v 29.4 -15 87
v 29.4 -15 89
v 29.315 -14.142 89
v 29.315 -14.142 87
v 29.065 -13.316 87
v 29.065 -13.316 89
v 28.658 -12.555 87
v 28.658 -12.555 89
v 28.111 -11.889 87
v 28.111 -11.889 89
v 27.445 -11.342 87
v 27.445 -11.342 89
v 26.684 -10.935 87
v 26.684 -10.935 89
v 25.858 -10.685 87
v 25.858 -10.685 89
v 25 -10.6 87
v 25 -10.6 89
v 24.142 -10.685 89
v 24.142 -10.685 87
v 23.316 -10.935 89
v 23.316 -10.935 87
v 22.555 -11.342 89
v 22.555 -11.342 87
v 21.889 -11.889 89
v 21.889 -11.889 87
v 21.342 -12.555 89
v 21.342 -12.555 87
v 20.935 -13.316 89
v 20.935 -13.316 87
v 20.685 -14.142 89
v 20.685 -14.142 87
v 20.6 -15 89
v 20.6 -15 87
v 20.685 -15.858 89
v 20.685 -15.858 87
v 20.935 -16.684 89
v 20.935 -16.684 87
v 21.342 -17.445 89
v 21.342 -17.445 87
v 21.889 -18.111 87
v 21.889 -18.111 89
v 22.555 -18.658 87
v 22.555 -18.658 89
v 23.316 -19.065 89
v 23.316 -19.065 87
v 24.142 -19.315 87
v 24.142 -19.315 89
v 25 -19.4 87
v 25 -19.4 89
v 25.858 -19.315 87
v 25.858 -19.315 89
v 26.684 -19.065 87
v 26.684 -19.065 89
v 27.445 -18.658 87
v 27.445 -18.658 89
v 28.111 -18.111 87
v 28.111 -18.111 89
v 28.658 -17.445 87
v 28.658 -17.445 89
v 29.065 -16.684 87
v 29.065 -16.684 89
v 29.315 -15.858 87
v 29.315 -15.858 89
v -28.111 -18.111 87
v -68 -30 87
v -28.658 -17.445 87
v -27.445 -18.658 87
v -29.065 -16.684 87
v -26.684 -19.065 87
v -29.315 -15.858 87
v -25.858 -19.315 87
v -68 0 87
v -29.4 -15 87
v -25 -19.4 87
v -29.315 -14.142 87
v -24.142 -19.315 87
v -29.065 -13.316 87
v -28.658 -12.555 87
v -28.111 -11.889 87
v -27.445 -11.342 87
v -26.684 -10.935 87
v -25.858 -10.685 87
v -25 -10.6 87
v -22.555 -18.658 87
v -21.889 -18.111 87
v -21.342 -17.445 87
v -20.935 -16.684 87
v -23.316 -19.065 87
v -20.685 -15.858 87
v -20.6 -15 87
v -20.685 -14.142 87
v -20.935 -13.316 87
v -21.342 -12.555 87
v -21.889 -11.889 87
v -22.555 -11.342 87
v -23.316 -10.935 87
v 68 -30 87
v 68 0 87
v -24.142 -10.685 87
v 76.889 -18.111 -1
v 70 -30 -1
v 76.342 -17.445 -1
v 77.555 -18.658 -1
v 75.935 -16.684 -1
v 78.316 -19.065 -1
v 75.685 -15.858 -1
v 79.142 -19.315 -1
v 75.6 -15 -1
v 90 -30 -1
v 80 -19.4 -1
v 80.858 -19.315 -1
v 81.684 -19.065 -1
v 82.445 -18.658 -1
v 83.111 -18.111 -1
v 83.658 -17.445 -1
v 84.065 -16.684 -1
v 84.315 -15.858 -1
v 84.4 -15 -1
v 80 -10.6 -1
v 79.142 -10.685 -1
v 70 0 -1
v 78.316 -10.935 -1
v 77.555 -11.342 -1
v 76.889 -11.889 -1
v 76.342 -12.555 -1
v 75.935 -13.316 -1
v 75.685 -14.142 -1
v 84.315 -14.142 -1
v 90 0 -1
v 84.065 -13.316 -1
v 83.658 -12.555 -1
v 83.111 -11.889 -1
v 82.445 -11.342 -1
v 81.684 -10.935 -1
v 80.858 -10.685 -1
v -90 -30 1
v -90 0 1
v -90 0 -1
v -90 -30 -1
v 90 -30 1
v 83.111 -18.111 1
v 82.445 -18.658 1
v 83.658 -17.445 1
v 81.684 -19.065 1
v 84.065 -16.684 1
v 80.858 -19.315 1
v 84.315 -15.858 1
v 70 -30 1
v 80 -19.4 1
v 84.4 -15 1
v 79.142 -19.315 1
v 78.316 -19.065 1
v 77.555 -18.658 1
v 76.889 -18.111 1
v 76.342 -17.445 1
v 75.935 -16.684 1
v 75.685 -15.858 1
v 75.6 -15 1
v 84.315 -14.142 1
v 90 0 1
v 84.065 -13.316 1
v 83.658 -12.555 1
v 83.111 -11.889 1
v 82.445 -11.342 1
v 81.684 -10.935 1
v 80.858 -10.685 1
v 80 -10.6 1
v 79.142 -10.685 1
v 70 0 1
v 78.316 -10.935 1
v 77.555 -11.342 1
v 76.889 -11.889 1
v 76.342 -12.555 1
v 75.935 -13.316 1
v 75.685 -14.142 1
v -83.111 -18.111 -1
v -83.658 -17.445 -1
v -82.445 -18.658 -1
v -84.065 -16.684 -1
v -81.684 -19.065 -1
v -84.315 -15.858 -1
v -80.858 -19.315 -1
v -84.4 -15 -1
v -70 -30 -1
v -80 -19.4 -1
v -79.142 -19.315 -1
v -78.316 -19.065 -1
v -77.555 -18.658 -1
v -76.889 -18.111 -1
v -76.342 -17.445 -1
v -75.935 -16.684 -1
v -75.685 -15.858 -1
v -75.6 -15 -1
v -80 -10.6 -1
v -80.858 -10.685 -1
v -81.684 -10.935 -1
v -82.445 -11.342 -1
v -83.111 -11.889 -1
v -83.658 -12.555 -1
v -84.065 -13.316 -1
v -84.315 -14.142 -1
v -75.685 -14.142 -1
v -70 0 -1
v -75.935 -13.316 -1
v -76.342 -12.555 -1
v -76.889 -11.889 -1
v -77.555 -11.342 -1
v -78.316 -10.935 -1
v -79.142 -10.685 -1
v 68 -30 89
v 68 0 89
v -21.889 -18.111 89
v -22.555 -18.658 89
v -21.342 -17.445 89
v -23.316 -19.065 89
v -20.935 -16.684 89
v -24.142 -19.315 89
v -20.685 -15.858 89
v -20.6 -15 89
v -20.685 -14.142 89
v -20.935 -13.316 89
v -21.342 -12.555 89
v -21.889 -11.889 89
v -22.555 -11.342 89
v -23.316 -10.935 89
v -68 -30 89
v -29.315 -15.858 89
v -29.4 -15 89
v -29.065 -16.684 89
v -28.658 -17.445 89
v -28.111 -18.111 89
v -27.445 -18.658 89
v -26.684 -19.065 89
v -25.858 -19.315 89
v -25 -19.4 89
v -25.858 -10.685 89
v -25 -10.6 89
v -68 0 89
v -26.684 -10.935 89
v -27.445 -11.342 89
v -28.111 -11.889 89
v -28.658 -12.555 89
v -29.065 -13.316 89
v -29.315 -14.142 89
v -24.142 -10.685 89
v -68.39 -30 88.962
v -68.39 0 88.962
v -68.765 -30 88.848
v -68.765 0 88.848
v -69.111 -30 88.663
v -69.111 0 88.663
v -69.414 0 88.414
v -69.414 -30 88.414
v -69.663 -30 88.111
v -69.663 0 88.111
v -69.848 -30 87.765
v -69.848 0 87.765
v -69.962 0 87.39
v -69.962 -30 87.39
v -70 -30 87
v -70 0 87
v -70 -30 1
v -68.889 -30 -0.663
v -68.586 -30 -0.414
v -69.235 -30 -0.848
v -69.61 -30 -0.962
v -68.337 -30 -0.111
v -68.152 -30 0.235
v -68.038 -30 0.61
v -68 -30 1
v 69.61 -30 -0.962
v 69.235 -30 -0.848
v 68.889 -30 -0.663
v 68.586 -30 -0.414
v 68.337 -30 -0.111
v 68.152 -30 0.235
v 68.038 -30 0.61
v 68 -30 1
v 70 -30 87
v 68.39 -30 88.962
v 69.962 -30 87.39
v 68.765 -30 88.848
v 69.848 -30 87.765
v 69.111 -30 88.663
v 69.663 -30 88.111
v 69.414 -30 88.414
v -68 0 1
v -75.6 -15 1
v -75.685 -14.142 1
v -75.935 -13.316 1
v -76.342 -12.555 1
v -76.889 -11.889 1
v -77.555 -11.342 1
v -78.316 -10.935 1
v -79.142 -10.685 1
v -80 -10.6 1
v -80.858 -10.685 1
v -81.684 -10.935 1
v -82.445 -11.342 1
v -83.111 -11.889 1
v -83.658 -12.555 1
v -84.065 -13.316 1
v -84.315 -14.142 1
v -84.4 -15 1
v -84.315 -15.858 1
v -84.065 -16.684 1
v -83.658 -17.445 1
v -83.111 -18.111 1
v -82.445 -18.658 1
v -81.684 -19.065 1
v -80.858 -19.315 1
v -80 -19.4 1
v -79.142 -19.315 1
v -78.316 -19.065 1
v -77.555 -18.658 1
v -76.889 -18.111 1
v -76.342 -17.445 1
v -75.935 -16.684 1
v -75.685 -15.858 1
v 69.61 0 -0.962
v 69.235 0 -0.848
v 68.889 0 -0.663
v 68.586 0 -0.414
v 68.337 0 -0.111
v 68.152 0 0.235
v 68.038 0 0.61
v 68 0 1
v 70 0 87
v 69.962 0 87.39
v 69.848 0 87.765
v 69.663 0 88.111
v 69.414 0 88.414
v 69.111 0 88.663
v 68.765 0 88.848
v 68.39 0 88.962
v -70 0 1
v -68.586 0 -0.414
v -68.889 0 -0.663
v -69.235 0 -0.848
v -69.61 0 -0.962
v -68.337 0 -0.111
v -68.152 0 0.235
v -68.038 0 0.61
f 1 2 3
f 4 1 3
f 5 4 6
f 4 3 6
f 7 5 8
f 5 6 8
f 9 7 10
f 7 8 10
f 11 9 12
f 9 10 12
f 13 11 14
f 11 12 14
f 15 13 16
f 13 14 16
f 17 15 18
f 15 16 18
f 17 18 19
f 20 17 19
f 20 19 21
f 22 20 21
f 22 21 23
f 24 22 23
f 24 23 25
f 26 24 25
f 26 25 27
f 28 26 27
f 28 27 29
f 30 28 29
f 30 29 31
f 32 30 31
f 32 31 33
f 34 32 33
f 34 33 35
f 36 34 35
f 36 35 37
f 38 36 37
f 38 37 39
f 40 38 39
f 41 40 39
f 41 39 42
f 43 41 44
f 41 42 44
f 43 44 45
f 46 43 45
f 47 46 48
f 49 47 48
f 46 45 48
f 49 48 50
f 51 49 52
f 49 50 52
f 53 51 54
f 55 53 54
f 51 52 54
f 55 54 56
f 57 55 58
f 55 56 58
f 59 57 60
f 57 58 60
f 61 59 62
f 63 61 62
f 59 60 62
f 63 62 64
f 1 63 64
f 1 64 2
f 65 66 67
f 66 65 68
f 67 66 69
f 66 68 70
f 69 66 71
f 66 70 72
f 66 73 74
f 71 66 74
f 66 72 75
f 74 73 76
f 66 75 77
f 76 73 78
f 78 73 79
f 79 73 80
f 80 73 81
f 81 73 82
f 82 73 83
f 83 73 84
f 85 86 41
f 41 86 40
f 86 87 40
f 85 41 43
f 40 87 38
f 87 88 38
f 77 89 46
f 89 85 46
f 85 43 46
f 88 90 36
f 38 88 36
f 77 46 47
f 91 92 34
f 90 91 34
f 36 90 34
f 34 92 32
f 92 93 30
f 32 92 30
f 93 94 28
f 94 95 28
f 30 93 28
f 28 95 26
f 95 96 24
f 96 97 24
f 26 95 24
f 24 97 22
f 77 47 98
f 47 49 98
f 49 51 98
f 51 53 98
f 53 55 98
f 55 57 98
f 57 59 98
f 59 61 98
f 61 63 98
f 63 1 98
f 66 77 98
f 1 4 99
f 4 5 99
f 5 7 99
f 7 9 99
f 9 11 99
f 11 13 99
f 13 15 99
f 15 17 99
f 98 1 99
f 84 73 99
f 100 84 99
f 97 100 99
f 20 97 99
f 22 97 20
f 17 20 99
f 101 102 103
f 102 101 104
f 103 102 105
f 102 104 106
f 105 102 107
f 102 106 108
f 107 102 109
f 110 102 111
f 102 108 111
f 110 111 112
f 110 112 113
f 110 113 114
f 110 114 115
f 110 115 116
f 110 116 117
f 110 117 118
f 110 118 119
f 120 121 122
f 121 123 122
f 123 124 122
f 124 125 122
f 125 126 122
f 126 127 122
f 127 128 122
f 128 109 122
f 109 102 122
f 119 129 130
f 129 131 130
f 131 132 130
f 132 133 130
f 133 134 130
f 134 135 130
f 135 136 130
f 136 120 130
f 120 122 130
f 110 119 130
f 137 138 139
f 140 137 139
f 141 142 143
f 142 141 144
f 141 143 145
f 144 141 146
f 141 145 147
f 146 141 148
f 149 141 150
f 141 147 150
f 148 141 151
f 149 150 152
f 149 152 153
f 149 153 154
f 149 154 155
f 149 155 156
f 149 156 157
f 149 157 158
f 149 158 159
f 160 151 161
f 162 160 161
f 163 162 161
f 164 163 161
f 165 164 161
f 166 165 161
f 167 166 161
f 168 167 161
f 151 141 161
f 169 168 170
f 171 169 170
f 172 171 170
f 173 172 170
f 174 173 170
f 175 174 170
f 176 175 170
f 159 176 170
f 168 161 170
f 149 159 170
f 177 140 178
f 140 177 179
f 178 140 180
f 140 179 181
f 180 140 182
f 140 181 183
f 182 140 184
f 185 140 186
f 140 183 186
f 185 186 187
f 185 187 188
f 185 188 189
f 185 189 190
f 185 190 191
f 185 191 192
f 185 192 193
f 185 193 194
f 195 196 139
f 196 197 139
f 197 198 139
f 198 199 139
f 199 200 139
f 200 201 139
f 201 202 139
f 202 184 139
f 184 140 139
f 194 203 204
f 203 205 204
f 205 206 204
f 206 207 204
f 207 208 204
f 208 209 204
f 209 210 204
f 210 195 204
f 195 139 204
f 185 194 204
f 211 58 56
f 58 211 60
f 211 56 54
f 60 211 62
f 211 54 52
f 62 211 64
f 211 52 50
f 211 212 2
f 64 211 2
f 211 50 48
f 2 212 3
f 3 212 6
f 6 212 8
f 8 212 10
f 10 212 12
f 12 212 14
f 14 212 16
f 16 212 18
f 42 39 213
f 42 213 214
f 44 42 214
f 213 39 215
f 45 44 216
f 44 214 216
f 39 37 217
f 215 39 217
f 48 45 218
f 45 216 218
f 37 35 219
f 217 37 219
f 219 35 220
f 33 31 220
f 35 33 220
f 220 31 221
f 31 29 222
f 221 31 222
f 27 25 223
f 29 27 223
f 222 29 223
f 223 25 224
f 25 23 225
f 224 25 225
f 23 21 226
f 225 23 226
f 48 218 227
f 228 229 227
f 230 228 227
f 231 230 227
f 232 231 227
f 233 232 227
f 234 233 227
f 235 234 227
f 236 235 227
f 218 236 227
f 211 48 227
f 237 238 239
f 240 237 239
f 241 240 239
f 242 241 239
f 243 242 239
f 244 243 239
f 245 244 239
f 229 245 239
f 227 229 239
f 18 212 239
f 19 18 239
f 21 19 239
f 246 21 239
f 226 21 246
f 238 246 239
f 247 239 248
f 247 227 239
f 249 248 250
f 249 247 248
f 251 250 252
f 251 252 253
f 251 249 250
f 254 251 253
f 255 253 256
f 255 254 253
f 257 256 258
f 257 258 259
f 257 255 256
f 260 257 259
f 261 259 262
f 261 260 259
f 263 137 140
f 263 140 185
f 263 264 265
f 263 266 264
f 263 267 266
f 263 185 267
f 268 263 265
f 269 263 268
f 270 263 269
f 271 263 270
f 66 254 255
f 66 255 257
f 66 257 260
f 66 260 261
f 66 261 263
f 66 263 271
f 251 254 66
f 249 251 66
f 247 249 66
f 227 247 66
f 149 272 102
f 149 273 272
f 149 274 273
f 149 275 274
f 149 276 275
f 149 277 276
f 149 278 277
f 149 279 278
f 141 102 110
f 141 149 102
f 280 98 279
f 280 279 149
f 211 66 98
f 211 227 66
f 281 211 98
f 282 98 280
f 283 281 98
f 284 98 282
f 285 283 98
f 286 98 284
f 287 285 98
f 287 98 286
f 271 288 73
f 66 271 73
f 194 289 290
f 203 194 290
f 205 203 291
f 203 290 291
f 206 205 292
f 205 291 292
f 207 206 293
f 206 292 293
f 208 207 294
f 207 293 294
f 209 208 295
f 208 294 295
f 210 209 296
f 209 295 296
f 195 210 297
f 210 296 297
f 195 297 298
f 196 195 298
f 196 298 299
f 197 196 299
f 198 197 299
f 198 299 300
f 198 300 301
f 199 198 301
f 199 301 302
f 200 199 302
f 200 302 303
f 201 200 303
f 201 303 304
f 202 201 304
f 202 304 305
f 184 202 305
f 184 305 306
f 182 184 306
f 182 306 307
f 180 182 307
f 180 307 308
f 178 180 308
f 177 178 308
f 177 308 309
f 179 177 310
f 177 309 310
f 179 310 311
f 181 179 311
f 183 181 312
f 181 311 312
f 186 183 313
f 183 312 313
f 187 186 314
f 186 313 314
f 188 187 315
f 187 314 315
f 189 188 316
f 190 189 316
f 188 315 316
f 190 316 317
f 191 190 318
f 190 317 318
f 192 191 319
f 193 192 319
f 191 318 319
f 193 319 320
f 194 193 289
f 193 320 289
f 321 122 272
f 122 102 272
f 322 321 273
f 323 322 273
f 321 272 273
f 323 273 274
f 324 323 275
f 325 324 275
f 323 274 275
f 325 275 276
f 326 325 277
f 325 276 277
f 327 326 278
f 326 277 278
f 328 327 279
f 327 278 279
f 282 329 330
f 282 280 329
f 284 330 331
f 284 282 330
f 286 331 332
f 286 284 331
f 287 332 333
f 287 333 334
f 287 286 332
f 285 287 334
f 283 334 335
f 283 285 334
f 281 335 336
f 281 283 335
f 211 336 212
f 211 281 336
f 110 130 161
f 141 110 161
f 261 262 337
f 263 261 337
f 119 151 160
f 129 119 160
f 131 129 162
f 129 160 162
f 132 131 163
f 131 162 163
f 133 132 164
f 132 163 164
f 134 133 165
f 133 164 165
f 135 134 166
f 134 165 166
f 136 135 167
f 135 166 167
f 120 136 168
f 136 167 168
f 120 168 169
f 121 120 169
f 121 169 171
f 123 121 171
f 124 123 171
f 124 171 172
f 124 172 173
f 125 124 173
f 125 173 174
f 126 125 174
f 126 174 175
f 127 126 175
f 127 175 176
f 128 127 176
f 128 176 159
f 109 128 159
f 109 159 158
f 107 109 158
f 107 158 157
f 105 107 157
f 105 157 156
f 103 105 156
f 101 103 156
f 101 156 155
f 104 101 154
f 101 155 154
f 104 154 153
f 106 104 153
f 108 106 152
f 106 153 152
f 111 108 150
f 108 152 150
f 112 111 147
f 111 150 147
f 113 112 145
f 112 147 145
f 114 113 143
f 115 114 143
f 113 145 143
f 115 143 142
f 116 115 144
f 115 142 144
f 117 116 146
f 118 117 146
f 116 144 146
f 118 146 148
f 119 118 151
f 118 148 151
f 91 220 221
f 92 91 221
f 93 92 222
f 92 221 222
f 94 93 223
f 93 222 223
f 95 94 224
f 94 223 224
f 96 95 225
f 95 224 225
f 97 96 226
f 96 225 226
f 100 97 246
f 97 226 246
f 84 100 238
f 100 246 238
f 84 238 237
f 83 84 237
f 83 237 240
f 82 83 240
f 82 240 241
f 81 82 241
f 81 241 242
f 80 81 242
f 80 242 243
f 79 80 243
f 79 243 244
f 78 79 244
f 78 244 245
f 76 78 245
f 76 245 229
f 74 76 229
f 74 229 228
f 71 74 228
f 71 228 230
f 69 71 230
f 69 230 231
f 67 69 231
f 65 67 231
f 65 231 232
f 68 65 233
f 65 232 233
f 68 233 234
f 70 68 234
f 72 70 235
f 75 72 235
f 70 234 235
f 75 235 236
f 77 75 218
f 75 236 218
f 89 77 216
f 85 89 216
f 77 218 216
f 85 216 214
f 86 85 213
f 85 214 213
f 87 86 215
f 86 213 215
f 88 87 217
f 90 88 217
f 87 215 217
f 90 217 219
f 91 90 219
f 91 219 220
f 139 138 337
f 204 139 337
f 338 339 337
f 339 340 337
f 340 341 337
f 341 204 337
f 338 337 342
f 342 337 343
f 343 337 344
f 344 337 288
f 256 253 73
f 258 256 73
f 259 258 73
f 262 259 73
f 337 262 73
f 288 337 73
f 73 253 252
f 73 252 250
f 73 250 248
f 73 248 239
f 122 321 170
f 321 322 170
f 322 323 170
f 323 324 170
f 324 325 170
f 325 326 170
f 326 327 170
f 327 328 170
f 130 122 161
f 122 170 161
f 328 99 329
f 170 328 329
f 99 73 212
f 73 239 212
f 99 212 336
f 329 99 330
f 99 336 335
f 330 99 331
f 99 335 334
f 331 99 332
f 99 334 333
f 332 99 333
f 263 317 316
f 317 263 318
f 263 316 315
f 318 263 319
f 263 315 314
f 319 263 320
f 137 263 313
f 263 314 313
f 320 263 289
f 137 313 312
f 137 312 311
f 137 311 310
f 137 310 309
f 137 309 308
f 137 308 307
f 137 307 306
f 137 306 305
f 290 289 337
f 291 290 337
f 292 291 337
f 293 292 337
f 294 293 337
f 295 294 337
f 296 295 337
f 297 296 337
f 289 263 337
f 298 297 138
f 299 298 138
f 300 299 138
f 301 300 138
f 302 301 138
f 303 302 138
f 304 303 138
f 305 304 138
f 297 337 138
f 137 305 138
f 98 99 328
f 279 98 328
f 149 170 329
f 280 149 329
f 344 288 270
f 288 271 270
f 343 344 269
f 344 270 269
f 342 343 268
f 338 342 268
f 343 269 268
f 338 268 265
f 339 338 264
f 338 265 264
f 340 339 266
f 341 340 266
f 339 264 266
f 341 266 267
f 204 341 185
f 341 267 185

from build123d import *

# Parameters (mm, degrees)
F1_DEPTH = 30
F2_R     = 4.4
F3_R     = 4.4
F4_DEPTH = 25
F5_R     = 2
F6_R     = 2


# Not quite as in the source:
# - a feature names something its author has since deleted; it is built from what else it names


with BuildPart() as f1:
    # F0 (on Front) → F1 (new body)
    with BuildSketch(Plane.XZ):
        Polygon((90, -1), (90, 1), (70, 1), (70, 89), (-70, 89), (-70, 1), (-90, 1), (-90, -1), (-68, -1), (-68, 87), (68, 87), (68, -1), align=None)
    extrude(amount=F1_DEPTH)

    # F2 (on face) + F3 (on face) → F4 (cut)
    with BuildSketch(Plane.XY.offset(1)):
        with Locations((-80, -15)):
            Circle(F2_R)
        with Locations((80, -15)):
            Circle(F2_R)
    with BuildSketch(Plane.XY.offset(89)):
        with Locations((-25, -15)):
            Circle(F3_R)
        with Locations((25, -15)):
            Circle(F3_R)
    extrude(amount=-F4_DEPTH, mode=Mode.SUBTRACT)

    # F5
    f5_edges = [f1.edges().sort_by_distance(p)[0] for p in [
        (-70, -15, 89),
        (70, -15, 89),
    ]]
    fillet(f5_edges, radius=F5_R)

    # F6
    f6_edges = [f1.edges().sort_by_distance(p)[0] for p in [
        (68, -15, -1),
        (-68, -15, -1),
    ]]
    fillet(f6_edges, radius=F6_R)


solid = f1.part
